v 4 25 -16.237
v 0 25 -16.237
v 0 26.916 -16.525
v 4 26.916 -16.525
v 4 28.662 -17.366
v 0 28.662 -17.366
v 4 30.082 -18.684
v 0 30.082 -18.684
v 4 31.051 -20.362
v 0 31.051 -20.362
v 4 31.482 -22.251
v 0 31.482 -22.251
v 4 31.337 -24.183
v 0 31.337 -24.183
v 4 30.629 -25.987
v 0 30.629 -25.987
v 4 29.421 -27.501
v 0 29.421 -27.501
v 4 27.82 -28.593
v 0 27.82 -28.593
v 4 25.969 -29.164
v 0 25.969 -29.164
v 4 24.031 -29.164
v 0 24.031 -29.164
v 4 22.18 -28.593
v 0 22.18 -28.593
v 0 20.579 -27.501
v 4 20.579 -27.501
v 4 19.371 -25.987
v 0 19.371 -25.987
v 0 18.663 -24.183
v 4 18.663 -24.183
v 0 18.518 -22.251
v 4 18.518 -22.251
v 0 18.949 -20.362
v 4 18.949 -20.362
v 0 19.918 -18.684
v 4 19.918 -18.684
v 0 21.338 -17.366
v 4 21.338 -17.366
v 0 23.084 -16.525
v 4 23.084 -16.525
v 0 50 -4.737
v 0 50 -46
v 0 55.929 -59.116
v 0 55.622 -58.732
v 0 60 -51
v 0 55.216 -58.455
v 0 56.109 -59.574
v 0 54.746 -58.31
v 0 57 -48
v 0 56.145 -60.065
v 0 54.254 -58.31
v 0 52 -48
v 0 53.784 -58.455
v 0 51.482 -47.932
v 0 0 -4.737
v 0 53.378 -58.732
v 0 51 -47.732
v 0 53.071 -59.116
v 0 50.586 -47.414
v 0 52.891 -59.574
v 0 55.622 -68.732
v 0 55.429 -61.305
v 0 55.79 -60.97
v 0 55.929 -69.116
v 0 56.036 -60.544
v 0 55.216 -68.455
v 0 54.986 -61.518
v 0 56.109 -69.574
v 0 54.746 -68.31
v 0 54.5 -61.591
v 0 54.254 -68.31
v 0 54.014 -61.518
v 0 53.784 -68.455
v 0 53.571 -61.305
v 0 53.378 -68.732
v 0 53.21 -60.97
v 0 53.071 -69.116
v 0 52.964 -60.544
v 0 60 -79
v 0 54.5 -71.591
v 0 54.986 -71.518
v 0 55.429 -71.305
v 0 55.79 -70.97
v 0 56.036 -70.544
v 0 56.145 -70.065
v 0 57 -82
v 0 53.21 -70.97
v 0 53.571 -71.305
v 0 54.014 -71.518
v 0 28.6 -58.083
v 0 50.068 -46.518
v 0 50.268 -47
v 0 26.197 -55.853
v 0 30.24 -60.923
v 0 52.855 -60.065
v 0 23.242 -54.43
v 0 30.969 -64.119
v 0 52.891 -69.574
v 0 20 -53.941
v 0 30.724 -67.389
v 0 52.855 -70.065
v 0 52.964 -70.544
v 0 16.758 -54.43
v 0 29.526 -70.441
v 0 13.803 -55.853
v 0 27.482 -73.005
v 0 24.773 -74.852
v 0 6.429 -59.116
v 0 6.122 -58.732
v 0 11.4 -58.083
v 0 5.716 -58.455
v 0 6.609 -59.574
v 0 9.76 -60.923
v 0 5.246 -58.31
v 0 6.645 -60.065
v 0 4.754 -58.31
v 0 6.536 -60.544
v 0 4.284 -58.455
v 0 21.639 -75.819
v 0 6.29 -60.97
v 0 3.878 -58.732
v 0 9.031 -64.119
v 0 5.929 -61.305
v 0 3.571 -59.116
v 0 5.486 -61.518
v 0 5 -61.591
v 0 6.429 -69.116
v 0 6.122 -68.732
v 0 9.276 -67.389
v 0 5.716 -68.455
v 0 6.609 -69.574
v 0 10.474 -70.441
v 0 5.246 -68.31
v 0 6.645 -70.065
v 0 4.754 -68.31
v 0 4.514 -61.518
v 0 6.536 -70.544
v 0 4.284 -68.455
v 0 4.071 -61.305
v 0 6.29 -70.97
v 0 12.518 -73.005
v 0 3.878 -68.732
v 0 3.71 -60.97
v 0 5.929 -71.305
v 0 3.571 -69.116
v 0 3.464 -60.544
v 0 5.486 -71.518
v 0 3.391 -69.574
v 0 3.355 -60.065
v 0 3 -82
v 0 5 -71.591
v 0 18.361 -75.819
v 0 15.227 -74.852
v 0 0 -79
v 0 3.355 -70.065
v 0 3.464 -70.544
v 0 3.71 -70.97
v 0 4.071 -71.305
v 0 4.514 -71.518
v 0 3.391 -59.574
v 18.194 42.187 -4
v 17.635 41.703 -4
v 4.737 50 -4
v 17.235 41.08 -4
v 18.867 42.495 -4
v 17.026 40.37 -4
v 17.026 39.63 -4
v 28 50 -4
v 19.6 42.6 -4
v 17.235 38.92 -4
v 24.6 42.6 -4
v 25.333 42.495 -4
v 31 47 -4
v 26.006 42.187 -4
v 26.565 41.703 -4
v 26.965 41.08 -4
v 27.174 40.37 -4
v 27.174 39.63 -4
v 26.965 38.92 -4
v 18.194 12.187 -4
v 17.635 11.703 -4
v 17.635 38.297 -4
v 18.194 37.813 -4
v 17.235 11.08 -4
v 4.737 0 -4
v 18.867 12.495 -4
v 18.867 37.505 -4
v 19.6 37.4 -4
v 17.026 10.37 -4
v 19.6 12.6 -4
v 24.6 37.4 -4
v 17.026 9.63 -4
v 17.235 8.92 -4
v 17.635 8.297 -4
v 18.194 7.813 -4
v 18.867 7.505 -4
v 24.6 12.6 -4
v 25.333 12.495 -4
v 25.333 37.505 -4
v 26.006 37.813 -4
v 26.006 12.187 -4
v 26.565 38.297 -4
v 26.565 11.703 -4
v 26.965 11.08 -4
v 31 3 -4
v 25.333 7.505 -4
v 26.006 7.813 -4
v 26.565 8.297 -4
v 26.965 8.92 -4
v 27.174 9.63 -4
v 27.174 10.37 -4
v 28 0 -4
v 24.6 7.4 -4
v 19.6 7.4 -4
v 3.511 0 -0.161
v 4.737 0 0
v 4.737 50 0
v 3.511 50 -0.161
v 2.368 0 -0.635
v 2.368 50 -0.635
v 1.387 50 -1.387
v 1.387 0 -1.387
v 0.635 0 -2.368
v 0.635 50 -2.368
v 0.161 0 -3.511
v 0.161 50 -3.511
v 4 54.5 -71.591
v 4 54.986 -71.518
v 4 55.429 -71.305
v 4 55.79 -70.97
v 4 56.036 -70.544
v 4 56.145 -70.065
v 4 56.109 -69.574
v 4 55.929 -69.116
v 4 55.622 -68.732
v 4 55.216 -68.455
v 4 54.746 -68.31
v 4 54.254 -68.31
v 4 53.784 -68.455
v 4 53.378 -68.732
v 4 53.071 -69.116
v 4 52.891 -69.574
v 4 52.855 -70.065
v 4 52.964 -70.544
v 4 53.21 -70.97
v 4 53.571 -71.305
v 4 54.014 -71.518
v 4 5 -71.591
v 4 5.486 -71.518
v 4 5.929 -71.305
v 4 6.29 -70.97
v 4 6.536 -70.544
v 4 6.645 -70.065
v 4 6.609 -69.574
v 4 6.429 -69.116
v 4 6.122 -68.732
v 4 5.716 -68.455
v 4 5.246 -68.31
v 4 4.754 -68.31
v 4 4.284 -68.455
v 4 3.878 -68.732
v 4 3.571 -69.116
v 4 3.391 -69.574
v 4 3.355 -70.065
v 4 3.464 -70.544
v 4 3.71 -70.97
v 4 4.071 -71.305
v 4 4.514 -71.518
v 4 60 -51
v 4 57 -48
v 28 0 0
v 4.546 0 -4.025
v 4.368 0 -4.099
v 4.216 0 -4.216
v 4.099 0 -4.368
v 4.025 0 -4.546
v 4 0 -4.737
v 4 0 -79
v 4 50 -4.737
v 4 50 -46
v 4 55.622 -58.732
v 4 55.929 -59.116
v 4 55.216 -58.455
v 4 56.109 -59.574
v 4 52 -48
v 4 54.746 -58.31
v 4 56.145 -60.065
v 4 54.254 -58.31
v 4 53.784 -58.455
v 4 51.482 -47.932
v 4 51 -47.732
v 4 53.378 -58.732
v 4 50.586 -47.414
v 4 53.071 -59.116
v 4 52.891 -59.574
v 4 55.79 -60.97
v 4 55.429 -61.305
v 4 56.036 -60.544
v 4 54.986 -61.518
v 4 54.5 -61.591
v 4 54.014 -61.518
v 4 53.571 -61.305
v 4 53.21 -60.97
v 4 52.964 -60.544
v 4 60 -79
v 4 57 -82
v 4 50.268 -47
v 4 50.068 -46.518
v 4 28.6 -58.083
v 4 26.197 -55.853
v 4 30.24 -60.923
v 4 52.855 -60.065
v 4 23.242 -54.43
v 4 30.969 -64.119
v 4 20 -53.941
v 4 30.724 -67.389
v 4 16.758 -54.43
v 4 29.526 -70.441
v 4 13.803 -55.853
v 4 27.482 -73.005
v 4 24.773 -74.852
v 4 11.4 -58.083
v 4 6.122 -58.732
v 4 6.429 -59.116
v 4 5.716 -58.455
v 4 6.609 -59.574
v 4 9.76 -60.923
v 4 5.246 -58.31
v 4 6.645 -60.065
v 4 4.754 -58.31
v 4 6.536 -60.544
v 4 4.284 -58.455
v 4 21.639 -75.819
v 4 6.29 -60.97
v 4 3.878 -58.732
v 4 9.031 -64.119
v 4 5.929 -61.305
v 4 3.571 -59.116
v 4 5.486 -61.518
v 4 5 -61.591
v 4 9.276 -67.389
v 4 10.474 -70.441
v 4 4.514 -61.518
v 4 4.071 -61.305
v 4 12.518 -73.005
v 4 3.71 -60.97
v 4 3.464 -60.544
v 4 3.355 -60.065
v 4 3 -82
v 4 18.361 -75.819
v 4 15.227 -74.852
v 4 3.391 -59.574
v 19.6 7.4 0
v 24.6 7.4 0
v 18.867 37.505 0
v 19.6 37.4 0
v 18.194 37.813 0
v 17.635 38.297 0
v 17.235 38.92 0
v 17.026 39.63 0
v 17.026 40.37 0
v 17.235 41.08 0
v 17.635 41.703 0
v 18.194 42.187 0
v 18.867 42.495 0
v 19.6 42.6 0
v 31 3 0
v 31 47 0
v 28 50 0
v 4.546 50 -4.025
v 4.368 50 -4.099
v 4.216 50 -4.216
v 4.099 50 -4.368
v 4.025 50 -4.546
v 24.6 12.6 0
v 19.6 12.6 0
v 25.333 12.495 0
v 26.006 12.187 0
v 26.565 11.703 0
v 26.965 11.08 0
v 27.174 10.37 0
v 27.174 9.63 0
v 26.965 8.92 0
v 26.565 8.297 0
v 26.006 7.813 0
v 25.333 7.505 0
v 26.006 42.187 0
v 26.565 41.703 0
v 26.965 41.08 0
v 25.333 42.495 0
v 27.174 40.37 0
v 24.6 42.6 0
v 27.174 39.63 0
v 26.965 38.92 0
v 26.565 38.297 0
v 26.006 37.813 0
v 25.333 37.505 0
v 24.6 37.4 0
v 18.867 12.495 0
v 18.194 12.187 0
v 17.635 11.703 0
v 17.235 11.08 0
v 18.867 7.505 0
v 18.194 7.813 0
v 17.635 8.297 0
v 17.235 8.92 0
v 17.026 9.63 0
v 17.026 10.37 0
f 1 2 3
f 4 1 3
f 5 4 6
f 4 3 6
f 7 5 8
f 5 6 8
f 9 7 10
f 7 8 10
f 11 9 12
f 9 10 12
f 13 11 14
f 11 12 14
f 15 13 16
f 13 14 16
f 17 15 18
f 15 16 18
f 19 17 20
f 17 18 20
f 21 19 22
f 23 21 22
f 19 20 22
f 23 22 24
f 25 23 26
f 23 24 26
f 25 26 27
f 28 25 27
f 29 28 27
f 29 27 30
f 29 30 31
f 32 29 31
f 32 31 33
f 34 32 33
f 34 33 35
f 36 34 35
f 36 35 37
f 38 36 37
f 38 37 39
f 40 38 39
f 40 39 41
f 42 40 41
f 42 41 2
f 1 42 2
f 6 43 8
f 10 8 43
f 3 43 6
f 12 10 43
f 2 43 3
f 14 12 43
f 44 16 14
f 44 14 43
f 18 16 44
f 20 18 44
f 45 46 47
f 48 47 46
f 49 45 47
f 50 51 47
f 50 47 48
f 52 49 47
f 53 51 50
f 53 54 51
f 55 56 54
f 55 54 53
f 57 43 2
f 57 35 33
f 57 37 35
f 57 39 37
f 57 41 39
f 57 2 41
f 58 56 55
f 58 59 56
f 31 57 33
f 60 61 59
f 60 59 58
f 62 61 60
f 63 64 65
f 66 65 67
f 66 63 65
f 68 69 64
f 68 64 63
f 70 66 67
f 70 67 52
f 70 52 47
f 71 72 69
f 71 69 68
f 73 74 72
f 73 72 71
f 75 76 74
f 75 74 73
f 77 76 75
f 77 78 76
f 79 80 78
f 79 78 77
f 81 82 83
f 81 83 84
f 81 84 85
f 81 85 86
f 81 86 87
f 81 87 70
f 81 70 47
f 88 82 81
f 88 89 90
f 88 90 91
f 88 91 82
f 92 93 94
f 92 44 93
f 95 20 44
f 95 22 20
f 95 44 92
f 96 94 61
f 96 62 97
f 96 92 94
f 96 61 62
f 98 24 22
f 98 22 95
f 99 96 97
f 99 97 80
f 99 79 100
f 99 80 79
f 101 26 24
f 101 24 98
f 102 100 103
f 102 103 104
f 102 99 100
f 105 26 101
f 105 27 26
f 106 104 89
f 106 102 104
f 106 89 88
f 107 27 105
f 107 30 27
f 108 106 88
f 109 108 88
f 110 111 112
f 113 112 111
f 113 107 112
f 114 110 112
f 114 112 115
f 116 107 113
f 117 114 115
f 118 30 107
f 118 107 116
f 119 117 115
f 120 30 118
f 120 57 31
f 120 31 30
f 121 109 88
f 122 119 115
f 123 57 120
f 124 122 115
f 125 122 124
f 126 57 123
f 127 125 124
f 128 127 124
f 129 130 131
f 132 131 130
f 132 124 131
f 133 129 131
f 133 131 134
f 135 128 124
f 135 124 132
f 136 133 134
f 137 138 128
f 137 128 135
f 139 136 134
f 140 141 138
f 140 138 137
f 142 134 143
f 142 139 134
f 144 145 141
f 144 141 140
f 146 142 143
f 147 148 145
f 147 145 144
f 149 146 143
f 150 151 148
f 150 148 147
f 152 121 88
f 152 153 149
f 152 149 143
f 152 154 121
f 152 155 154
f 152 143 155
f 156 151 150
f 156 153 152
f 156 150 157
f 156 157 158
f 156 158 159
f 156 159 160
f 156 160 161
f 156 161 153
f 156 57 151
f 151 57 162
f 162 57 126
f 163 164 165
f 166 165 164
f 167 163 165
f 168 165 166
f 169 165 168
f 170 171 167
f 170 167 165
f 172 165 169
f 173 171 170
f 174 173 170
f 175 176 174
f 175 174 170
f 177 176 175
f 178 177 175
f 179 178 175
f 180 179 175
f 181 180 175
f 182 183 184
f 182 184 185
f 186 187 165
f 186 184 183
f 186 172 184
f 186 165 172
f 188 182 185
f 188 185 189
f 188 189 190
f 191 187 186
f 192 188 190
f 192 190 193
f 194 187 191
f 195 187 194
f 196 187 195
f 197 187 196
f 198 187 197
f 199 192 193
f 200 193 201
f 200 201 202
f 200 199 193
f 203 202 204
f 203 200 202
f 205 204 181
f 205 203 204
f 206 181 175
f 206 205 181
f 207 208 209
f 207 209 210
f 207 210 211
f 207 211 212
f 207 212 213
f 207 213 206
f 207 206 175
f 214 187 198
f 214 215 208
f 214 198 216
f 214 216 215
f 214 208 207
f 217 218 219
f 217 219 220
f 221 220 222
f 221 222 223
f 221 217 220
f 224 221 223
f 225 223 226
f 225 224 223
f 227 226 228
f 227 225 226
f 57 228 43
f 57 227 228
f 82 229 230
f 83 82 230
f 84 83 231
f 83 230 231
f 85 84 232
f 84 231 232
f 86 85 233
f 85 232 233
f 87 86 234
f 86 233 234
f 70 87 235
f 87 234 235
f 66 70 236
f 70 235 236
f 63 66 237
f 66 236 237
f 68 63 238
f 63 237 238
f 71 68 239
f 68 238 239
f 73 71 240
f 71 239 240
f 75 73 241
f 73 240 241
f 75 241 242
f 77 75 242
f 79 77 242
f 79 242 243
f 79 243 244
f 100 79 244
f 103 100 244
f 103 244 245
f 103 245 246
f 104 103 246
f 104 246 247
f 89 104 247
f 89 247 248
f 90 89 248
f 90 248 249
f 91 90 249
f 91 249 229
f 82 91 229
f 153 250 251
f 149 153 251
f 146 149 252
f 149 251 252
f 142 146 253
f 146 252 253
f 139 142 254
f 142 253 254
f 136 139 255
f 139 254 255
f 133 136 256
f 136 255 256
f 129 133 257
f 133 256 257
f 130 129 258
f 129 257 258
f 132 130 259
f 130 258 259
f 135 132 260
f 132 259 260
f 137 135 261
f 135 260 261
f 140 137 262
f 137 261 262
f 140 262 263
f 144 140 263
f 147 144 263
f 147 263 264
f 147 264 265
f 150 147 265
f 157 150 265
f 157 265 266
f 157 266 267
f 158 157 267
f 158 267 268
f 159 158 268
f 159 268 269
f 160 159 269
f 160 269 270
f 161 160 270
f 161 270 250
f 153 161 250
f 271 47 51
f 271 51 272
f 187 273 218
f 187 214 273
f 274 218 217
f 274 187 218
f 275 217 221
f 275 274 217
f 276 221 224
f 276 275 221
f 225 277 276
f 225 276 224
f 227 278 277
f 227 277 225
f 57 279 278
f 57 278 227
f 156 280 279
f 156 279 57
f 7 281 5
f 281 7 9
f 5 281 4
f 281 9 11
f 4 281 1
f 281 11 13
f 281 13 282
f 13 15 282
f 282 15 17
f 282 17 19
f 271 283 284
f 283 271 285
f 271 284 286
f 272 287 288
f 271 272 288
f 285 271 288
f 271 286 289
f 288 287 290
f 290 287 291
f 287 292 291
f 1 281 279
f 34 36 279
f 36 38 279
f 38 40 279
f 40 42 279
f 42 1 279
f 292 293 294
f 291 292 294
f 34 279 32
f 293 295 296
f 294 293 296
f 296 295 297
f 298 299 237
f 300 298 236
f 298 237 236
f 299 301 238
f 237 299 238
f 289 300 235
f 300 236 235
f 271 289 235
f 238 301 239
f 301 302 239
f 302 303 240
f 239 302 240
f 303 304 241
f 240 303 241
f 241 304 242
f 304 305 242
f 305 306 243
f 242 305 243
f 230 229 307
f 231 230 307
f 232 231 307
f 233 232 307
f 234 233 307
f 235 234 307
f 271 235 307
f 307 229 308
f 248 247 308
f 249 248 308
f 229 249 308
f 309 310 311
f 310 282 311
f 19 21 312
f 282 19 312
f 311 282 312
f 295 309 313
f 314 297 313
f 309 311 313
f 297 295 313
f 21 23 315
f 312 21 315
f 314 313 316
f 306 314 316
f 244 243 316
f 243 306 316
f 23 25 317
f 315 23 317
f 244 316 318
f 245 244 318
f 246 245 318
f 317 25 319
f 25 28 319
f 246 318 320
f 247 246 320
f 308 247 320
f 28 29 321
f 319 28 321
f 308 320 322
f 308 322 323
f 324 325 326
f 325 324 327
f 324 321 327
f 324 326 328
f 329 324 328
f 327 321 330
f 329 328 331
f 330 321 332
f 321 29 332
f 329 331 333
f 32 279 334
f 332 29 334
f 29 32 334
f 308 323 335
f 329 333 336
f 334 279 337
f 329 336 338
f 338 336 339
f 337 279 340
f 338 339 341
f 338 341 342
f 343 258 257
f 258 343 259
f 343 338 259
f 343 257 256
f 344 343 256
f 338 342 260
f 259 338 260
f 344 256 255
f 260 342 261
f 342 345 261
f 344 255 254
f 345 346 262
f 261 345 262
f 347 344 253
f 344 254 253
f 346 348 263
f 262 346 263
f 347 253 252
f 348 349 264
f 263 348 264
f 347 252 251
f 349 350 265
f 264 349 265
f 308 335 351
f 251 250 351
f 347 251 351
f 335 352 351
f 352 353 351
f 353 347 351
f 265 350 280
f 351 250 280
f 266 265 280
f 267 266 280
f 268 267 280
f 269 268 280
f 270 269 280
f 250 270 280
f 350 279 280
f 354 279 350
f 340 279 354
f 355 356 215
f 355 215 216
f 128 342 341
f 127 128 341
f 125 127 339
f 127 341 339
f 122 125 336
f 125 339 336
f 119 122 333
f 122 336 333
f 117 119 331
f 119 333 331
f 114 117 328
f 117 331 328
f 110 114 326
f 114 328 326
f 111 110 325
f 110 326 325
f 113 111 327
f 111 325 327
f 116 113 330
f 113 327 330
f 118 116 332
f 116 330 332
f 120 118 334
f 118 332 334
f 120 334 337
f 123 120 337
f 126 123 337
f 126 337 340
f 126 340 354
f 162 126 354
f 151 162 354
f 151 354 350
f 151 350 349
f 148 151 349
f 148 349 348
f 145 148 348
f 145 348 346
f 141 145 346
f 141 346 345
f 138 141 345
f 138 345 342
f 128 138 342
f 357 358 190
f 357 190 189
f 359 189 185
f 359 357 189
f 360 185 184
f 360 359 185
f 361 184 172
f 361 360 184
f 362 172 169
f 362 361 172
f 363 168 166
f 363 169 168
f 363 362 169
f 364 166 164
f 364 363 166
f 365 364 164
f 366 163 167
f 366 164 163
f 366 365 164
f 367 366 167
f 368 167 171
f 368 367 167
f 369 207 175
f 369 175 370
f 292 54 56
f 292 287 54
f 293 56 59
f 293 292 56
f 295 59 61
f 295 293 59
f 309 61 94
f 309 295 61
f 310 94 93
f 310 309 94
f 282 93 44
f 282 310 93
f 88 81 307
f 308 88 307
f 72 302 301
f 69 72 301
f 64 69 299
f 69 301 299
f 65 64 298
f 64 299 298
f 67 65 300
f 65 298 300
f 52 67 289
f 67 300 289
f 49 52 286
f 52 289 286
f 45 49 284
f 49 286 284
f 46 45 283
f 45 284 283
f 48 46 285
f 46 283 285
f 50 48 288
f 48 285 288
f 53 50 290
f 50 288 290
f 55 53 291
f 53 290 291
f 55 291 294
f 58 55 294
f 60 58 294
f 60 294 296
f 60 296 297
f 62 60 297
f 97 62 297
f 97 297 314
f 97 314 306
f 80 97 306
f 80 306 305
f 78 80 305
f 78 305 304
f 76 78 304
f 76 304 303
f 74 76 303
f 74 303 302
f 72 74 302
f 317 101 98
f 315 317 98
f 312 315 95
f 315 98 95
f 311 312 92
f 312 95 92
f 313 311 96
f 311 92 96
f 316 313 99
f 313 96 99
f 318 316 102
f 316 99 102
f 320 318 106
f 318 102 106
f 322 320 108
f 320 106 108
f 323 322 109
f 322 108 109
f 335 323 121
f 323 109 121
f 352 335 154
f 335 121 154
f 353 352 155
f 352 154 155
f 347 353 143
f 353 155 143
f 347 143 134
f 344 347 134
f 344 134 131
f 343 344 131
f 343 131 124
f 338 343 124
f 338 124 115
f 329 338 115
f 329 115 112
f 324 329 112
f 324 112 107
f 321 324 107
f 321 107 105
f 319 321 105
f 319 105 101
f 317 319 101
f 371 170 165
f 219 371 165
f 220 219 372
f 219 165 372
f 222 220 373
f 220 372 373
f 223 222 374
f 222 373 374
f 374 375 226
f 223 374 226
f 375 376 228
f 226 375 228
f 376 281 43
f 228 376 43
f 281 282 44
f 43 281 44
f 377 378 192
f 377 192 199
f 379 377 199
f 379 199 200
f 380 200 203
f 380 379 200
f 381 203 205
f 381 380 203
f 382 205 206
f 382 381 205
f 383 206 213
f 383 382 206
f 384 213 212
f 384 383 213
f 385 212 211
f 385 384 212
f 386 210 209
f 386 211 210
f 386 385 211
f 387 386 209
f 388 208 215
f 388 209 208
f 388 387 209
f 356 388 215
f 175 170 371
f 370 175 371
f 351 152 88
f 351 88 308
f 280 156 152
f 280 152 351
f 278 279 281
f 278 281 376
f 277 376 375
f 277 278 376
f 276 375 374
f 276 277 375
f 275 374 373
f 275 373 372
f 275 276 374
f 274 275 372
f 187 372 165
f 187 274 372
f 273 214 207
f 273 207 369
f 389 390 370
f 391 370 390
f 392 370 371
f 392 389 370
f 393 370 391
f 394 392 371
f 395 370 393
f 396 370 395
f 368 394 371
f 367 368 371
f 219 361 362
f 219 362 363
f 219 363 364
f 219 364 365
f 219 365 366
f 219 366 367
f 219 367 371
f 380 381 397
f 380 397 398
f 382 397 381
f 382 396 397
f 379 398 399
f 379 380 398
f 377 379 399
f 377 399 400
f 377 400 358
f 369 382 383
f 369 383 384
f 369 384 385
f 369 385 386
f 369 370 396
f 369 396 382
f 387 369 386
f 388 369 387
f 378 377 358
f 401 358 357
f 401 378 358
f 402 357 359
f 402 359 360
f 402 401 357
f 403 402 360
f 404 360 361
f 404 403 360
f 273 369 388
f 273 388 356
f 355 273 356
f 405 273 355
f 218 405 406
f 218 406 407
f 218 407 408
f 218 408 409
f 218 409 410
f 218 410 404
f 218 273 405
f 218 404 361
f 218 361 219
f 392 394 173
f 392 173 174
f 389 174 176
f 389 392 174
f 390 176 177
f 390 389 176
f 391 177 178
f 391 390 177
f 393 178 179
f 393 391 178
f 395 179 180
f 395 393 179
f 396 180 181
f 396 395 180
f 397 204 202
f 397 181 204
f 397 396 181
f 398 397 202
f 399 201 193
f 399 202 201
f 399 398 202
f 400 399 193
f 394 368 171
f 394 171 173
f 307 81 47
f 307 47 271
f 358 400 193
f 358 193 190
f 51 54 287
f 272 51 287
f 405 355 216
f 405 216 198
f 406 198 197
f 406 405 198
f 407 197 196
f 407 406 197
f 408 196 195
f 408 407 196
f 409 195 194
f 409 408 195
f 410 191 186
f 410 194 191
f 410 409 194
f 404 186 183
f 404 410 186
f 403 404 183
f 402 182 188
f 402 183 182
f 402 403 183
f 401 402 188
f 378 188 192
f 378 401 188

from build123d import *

# Parameters (mm, degrees)
SM_BASE_FLANGE_1_DEPTH = 50
SKETCH_3_R             = 6.5
CUT_EXTRUDE_2_DEPTH    = 101.920760996
SKETCH_5_R             = 11
CUT_EXTRUDE_5_DEPTH    = 101.920760996
SKETCH_6_W             = 4
SKETCH_6_H             = 34
EXTRUDE_2_DEPTH        = 10
CHAMFER_1_SIZE         = 3
CUT_EXTRUDE_6_DEPTH    = 107.230880633
PATTERN_LINEAR_3_COUNT = 2
PATTERN_LINEAR_3_PITCH = 30
FILLET_1_R             = 2
M4X0_7_1_D             = 3.3


# Sheet-metal steps are written as plain solids
with BuildPart() as part:
    # Sketch 1 → 基材-凸緣1 (new body)
    with BuildSketch(Plane(origin=(0, 0, 0), x_dir=(1, 0, 0), z_dir=(0, 1, 0))):
        with BuildLine():
            Line((31, 0), (4.7366, 0))
            ThreePointArc((4.7366, 0), (1.38731802, 1.38731802), (0, 4.7366))
            Line((0, 4.7366), (0, 82))
            Line((0, 82), (4, 82))
            Line((4, 82), (4, 4.7366))
            ThreePointArc((4, 4.7366), (4.215745145, 4.215745145), (4.7366, 4))
            Line((4.7366, 4), (31, 4))
            Line((31, 4), (31, 0))
        make_face()
    extrude(amount=SM_BASE_FLANGE_1_DEPTH)

    # 草圖3 → 除料-伸長2 (cut, through all)
    with BuildSketch(Plane.ZY):
        with Locations((-22.7366, 25)):
            Circle(SKETCH_3_R)
    extrude(amount=-CUT_EXTRUDE_2_DEPTH, mode=Mode.SUBTRACT)

    # 草圖5 → 除料-伸長5 (cut, through all)
    with BuildSketch(Plane.ZY):
        with Locations((-64.94145754, 20)):
            Circle(SKETCH_5_R)
    extrude(amount=-CUT_EXTRUDE_5_DEPTH, mode=Mode.SUBTRACT)

    # 草圖6 → 填料-伸長2 (add)
    with BuildSketch(Plane(origin=(0, 50, 0), x_dir=(1, 0, 0), z_dir=(0, 1, 0))):
        with Locations((2, 65)):
            Rectangle(SKETCH_6_W, SKETCH_6_H)
    extrude(amount=EXTRUDE_2_DEPTH)

    # 導角1
    chamfer_1_edges = [part.edges().sort_by_distance(p)[0] for p in [
        (31, 50, -2),
        (2, 60, -48),
        (2, 60, -82),
        (31, 0, -2),
        (2, 0, -82),
    ]]
    chamfer(chamfer_1_edges, length=CHAMFER_1_SIZE)

    # 草圖8 → 除料-伸長6 (cut, through all)
    with BuildSketch(Plane.XY):
        with BuildLine():
            Line((19.6, 42.6), (24.6, 42.6))
            ThreePointArc((24.6, 42.6), (27.2, 40), (24.6, 37.4))
            Line((24.6, 37.4), (19.6, 37.4))
            ThreePointArc((19.6, 37.4), (17, 40), (19.6, 42.6))
        make_face()
    cut_extrude_6 = extrude(amount=-CUT_EXTRUDE_6_DEPTH, mode=Mode.SUBTRACT)

    # 直線複製排列3: 除料-伸長6 ×2
    with Locations(*[(0, -i * PATTERN_LINEAR_3_PITCH, 0) for i in range(1, PATTERN_LINEAR_3_COUNT)]):
        add(cut_extrude_6, mode=Mode.SUBTRACT)

    # 圓角1
    fillet_1_edges = [part.edges().sort_by_distance(p)[0] for p in [
        (2, 50, -48),
    ]]
    fillet(fillet_1_edges, radius=FILLET_1_R)

    # M4x0.7 螺紋孔1 (through all)
    with Locations(Plane.ZY):
        with Locations((-59.94145754, 5), (-69.94145754, 5), (-69.94145754, 54.5), (-59.94145754, 54.5)):
            Hole(M4X0_7_1_D / 2)


solid = part.part
